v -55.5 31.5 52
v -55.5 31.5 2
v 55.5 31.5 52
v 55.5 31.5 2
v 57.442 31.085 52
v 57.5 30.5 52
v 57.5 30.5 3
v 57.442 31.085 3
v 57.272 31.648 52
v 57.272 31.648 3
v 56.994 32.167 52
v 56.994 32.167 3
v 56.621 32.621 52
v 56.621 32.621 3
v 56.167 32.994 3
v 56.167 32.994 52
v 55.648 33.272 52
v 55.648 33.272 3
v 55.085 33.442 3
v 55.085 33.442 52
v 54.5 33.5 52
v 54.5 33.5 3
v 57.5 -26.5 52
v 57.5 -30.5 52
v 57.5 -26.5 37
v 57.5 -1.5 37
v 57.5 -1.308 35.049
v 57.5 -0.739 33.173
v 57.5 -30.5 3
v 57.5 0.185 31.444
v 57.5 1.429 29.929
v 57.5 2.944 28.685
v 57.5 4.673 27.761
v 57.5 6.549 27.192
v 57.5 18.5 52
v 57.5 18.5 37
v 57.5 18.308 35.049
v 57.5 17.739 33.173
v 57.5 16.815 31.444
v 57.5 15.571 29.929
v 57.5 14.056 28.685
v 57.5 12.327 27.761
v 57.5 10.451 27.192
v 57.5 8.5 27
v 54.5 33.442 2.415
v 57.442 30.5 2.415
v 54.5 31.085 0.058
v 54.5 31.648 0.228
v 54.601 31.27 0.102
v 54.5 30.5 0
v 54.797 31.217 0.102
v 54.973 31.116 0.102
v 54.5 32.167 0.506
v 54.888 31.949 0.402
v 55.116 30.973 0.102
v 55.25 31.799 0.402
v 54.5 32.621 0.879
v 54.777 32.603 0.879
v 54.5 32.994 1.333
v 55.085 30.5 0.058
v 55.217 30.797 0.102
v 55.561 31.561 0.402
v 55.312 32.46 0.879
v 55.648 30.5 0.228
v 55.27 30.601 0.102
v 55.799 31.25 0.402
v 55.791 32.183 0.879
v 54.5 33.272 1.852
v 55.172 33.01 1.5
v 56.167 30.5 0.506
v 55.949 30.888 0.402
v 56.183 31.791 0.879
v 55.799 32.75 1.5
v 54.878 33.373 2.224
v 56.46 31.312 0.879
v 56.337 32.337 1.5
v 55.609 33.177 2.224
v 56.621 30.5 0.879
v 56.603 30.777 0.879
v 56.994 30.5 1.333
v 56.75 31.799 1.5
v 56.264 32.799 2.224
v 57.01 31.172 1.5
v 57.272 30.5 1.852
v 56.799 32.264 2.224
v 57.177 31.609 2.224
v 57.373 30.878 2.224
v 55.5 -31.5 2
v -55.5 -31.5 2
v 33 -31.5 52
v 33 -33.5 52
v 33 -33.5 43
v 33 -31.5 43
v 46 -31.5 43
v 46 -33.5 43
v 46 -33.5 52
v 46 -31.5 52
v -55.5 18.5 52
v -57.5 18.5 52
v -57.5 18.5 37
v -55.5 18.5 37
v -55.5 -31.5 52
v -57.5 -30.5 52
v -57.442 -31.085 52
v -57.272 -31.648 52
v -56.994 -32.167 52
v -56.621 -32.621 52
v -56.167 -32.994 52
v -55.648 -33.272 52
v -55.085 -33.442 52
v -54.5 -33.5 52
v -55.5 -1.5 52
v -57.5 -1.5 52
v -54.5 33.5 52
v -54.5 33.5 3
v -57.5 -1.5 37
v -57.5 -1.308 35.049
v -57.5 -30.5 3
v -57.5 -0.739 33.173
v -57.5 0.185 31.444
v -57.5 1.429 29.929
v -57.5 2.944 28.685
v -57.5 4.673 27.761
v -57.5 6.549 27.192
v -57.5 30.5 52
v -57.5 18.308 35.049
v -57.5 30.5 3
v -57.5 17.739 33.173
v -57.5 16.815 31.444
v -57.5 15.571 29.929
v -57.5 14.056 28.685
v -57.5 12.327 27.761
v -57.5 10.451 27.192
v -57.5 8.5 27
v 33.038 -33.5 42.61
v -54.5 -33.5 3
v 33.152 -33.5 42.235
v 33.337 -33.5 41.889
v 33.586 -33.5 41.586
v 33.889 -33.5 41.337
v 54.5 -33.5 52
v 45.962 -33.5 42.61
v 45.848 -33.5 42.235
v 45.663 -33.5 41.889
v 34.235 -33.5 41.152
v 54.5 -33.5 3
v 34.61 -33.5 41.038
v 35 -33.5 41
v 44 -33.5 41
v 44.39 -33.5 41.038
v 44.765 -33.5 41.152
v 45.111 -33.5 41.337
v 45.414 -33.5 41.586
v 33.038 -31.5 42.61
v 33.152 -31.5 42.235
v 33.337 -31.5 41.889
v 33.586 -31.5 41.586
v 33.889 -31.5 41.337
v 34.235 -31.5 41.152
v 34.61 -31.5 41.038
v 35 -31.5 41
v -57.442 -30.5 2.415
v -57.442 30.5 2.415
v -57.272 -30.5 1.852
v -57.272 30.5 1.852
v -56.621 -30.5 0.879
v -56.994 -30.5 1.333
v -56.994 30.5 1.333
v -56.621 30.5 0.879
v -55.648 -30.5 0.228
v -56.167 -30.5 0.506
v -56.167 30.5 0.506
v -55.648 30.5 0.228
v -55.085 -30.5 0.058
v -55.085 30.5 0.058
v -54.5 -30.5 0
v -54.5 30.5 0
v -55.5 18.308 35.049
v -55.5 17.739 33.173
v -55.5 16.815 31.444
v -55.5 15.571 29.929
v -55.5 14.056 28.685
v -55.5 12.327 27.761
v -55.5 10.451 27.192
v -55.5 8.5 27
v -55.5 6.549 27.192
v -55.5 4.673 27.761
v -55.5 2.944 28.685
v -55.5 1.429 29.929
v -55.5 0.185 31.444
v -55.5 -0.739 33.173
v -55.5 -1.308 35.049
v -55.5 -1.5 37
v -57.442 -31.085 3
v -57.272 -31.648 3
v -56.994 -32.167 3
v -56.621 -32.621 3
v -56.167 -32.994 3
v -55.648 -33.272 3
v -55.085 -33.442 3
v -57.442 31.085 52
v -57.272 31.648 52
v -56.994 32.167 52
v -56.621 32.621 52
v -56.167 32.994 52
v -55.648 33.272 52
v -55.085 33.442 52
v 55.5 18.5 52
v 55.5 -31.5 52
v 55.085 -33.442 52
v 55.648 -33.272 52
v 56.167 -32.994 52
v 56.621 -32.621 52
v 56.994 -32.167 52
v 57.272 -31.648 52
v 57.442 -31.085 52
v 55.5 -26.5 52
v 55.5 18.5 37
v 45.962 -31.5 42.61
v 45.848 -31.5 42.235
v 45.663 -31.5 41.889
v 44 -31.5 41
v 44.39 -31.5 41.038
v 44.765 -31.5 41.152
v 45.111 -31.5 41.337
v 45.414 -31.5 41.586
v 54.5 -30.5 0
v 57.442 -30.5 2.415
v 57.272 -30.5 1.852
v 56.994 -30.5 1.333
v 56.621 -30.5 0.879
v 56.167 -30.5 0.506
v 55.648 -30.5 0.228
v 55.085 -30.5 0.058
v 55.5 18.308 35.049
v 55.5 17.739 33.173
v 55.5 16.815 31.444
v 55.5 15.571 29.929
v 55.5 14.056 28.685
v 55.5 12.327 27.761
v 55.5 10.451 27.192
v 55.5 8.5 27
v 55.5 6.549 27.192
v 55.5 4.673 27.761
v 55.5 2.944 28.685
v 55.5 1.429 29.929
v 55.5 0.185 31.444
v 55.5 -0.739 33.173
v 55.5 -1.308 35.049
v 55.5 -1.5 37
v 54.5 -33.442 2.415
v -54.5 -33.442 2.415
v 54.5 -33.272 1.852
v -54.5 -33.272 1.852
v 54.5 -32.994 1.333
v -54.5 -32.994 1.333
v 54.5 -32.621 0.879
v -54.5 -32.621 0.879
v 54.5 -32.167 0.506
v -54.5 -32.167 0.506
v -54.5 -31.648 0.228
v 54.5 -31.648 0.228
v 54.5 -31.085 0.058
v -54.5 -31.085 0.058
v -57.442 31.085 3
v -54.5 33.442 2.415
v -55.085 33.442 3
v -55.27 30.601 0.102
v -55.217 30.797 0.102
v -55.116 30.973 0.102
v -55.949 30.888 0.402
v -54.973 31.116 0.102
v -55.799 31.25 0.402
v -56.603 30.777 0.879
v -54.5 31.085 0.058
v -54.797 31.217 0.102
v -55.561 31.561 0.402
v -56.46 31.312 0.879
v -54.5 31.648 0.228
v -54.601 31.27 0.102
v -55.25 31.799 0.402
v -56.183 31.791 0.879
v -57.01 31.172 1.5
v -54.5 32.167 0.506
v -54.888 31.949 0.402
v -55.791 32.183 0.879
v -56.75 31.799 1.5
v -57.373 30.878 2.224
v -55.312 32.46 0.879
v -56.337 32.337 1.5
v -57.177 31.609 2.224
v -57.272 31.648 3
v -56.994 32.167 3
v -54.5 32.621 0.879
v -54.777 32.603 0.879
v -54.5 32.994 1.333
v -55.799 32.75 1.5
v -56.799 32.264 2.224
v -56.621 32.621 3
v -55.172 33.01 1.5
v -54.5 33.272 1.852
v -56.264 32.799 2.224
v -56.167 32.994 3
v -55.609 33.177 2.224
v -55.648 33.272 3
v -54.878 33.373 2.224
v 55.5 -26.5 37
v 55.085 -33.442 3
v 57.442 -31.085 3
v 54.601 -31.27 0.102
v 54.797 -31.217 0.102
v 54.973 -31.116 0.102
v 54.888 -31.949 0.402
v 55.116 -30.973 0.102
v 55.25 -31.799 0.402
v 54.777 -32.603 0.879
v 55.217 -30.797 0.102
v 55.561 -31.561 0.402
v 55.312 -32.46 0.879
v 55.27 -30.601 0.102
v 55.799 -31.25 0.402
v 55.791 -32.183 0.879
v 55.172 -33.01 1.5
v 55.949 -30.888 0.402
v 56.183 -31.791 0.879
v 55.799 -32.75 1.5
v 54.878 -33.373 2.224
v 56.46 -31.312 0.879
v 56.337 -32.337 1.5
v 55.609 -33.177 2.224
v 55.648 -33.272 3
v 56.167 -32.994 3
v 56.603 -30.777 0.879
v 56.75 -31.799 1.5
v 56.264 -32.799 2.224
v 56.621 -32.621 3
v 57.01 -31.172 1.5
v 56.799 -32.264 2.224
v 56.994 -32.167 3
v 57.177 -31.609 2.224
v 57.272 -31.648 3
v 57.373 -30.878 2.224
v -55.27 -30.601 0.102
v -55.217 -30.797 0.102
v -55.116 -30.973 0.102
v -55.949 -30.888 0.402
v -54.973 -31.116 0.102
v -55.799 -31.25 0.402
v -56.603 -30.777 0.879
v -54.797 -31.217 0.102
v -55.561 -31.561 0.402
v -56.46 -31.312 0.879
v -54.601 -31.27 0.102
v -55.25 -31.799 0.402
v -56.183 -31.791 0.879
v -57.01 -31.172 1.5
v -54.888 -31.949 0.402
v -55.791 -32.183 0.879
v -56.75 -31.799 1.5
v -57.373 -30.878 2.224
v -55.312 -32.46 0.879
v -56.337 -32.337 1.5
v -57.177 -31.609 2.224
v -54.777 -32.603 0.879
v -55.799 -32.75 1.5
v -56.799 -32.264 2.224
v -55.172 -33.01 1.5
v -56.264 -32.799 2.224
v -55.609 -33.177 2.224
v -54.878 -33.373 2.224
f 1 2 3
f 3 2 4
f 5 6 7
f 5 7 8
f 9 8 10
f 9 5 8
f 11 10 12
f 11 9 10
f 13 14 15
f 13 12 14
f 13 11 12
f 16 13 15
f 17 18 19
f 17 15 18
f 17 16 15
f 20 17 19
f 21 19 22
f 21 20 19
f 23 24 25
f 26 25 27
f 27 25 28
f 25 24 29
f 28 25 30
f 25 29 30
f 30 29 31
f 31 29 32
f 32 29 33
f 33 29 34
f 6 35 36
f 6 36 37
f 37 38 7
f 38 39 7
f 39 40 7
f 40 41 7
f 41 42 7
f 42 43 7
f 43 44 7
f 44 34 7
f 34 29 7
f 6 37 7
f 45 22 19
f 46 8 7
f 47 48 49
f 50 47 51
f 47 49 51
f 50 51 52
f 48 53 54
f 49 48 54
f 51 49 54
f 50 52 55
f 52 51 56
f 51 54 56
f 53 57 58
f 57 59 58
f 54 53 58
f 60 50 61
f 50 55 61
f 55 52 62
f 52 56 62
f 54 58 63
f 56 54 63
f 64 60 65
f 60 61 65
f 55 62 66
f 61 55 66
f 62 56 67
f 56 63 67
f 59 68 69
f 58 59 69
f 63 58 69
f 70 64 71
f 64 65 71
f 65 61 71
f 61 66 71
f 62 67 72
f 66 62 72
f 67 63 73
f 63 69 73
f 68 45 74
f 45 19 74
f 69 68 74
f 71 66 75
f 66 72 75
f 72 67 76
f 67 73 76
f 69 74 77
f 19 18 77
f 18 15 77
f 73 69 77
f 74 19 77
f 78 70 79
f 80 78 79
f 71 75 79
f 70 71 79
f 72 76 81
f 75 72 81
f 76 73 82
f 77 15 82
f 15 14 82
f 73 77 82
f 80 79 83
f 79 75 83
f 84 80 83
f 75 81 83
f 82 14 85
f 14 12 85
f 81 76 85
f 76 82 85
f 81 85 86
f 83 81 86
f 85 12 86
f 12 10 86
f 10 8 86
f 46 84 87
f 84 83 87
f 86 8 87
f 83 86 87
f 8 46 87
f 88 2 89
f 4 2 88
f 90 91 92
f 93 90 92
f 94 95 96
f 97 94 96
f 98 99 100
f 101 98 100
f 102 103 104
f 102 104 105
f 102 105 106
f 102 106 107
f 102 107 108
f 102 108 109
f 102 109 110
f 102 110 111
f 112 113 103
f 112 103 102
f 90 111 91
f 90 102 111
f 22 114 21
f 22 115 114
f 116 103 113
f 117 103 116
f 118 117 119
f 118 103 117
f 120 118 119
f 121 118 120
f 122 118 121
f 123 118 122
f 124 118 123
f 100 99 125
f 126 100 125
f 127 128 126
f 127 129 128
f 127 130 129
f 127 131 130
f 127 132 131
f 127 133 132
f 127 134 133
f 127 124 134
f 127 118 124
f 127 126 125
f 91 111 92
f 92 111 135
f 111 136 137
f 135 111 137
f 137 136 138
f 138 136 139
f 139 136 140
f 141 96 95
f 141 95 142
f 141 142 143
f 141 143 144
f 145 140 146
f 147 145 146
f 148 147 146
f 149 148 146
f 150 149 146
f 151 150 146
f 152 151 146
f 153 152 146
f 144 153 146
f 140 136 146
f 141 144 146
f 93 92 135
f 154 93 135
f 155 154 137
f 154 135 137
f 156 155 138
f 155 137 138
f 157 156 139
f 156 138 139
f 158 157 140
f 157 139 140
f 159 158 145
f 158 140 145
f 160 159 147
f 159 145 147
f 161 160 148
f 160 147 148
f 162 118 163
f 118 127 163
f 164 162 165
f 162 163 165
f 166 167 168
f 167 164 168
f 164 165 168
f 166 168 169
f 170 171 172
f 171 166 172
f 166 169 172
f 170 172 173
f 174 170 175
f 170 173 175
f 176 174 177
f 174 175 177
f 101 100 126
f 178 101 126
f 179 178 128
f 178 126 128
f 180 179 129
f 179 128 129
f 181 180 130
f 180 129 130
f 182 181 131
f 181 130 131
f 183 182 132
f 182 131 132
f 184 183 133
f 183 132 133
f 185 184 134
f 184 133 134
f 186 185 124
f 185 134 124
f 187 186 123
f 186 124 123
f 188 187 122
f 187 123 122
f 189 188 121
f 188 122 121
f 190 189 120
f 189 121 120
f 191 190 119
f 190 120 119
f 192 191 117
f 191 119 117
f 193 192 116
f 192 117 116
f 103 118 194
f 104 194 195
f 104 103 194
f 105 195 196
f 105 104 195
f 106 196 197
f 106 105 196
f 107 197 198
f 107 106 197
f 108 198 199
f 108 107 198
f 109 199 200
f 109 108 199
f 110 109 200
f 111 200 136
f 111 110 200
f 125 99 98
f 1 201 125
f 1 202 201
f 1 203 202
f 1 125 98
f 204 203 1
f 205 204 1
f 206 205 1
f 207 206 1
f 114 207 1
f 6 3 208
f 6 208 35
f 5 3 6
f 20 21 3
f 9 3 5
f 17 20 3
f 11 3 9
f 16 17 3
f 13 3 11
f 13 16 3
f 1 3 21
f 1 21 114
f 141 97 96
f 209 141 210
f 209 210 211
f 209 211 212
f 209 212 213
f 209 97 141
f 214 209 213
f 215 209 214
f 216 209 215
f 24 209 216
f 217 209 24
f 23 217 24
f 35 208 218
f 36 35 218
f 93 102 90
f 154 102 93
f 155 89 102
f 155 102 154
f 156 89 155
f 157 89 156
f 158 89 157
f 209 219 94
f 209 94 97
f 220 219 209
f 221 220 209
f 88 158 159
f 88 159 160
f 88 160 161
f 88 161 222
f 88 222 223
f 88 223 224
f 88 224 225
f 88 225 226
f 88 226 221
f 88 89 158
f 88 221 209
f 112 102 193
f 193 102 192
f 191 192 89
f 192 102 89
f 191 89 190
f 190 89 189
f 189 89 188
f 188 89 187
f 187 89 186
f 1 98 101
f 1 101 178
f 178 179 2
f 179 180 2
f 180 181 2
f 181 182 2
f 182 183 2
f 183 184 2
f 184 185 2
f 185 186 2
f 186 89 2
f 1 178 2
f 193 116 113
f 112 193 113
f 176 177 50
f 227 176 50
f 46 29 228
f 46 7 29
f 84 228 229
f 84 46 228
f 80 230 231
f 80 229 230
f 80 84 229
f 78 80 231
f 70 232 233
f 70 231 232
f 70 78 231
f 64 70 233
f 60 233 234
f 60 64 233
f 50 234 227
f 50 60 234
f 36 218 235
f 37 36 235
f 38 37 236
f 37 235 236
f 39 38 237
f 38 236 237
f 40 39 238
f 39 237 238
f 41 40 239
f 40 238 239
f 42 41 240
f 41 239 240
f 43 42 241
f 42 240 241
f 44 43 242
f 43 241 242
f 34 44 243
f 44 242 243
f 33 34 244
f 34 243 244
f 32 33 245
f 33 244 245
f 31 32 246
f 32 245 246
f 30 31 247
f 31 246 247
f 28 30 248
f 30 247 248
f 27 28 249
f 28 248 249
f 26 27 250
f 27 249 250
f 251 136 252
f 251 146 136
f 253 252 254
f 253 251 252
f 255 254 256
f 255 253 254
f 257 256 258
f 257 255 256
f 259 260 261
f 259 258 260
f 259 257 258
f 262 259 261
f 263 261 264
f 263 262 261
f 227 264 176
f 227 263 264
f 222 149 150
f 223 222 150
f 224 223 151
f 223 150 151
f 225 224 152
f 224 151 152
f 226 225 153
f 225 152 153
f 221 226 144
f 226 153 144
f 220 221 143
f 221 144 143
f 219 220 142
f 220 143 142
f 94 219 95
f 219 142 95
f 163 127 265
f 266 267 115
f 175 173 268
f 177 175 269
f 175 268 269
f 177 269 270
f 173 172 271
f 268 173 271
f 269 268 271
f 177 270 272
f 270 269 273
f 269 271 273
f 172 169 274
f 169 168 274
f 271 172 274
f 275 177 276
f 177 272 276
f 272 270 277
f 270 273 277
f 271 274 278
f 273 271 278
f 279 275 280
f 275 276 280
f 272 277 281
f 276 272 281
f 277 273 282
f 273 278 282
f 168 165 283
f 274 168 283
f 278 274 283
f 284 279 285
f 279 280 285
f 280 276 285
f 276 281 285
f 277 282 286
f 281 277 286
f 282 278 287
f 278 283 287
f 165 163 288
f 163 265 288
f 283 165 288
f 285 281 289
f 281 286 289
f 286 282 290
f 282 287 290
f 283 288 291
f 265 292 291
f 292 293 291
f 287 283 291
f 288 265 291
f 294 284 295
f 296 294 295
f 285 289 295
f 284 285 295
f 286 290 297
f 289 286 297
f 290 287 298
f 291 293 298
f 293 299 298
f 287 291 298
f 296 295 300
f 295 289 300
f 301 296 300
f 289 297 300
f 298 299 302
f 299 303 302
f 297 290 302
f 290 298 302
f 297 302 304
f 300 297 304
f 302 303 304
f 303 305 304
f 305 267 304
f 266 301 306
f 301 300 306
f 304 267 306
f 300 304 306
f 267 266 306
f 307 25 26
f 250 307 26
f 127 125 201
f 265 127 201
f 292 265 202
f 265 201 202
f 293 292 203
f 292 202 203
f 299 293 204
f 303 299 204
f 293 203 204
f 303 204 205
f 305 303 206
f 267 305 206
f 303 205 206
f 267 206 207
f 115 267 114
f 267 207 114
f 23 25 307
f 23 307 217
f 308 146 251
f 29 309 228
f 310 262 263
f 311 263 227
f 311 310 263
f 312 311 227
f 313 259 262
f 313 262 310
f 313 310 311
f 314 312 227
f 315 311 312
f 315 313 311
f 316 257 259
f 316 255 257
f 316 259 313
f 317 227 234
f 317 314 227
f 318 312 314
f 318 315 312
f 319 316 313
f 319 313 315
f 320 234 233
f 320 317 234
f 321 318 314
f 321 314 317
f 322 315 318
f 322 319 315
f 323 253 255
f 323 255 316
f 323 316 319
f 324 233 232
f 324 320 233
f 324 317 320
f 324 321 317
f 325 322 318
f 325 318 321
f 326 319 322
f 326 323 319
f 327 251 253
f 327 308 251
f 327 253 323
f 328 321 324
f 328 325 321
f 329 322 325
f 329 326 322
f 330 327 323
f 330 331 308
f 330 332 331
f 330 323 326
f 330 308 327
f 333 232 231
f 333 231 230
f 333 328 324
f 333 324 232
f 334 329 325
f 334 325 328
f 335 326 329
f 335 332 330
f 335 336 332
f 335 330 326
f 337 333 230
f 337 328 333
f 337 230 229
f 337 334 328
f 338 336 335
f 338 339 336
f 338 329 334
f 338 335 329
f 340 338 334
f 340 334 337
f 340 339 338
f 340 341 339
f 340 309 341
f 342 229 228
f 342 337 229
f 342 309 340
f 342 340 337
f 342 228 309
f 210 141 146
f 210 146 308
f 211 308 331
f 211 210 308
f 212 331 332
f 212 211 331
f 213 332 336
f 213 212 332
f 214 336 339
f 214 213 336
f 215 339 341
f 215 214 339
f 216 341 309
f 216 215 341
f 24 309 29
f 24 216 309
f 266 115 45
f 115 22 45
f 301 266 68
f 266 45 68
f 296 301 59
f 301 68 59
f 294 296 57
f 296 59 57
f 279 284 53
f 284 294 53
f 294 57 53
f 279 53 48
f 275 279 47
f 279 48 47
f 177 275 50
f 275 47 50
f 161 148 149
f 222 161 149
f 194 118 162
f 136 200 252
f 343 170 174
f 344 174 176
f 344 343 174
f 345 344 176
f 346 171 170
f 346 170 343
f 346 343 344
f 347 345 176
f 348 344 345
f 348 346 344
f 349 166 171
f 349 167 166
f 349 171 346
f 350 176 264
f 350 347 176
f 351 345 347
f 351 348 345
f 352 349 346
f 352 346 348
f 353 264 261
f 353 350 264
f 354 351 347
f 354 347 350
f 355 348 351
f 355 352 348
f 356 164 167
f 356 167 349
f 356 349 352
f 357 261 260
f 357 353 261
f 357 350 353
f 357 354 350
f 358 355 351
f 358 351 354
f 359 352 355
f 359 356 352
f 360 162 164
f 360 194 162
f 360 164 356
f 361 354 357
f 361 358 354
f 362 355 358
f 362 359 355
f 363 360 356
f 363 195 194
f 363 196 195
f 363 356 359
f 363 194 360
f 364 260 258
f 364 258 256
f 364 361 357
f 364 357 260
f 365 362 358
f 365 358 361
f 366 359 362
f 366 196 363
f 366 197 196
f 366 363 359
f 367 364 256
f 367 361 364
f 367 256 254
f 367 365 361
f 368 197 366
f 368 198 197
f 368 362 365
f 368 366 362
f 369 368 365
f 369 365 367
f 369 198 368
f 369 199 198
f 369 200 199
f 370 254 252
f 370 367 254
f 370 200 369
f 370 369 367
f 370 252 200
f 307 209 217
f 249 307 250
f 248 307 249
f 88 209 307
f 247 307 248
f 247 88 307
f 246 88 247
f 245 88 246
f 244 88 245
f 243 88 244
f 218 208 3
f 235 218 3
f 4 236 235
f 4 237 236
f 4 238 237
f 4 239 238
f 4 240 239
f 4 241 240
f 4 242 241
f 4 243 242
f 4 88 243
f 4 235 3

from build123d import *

# Parameters (mm, degrees)
F0_W     = 115
F0_H     = 67
F1_DEPTH = 52
F2_T     = -2
F3_R     = 3
F5_DEPTH = 115
F6_W     = 25
F6_H     = 15
F7_DEPTH = 2
F9_DEPTH = 2


with BuildPart() as f1:
    # F0 (on Top) → F1 (new body)
    with BuildSketch(Plane.XY):
        Rectangle(F0_W, F0_H)
    extrude(amount=F1_DEPTH)

    # F2
    f2_openings = [f1.faces().sort_by_distance(p)[0] for p in [
        (0, 0, 52),
    ]]
    offset(amount=F2_T, openings=f2_openings)

    # F3
    f3_edges = [f1.edges().sort_by_distance(p)[0] for p in [
        (57.5, 33.5, 26),
        (57.5, -33.5, 26),
        (-57.5, -33.5, 26),
        (-57.5, 33.5, 26),
        (-57.5, 0, 0),
        (0, -33.5, 0),
        (0, 33.5, 0),
        (57.5, 0, 0),
    ]]
    fillet(f3_edges, radius=F3_R)

    # F4 (on face) → F5 (cut, through all)
    with BuildSketch(Plane(origin=(-57.5, 0, 0), x_dir=(0, -1, 0), z_dir=(-1, 0, 0))):
        with BuildLine():
            Line((-8.5, 52), (-18.5, 52))
            Line((-18.5, 52), (-18.5, 37))
            ThreePointArc((-18.5, 37), (-8.5, 27), (1.5, 37))
            Line((1.5, 37), (1.5, 52))
            Line((1.5, 52), (-8.5, 52))
        make_face()
    extrude(amount=-F5_DEPTH, mode=Mode.SUBTRACT)

    # F6 (on face) → F7 (cut, through all)
    with BuildSketch(Plane.YZ.offset(57.5)):
        with Locations((-14, 44.5)):
            Rectangle(F6_W, F6_H)
    extrude(amount=-F7_DEPTH, mode=Mode.SUBTRACT)

    # F8 (on face) → F9 (cut, through all)
    with BuildSketch(Plane.XZ.offset(33.5)):
        with BuildLine():
            Line((46, 52), (33, 52))
            Line((33, 52), (33, 43))
            ThreePointArc((33, 43), (33.5857864376, 41.5857864376), (35, 41))
            Line((35, 41), (44, 41))
            ThreePointArc((44, 41), (45.4142135624, 41.5857864376), (46, 43))
            Line((46, 43), (46, 52))
        make_face()
    extrude(amount=-F9_DEPTH, mode=Mode.SUBTRACT)


solid = f1.part
